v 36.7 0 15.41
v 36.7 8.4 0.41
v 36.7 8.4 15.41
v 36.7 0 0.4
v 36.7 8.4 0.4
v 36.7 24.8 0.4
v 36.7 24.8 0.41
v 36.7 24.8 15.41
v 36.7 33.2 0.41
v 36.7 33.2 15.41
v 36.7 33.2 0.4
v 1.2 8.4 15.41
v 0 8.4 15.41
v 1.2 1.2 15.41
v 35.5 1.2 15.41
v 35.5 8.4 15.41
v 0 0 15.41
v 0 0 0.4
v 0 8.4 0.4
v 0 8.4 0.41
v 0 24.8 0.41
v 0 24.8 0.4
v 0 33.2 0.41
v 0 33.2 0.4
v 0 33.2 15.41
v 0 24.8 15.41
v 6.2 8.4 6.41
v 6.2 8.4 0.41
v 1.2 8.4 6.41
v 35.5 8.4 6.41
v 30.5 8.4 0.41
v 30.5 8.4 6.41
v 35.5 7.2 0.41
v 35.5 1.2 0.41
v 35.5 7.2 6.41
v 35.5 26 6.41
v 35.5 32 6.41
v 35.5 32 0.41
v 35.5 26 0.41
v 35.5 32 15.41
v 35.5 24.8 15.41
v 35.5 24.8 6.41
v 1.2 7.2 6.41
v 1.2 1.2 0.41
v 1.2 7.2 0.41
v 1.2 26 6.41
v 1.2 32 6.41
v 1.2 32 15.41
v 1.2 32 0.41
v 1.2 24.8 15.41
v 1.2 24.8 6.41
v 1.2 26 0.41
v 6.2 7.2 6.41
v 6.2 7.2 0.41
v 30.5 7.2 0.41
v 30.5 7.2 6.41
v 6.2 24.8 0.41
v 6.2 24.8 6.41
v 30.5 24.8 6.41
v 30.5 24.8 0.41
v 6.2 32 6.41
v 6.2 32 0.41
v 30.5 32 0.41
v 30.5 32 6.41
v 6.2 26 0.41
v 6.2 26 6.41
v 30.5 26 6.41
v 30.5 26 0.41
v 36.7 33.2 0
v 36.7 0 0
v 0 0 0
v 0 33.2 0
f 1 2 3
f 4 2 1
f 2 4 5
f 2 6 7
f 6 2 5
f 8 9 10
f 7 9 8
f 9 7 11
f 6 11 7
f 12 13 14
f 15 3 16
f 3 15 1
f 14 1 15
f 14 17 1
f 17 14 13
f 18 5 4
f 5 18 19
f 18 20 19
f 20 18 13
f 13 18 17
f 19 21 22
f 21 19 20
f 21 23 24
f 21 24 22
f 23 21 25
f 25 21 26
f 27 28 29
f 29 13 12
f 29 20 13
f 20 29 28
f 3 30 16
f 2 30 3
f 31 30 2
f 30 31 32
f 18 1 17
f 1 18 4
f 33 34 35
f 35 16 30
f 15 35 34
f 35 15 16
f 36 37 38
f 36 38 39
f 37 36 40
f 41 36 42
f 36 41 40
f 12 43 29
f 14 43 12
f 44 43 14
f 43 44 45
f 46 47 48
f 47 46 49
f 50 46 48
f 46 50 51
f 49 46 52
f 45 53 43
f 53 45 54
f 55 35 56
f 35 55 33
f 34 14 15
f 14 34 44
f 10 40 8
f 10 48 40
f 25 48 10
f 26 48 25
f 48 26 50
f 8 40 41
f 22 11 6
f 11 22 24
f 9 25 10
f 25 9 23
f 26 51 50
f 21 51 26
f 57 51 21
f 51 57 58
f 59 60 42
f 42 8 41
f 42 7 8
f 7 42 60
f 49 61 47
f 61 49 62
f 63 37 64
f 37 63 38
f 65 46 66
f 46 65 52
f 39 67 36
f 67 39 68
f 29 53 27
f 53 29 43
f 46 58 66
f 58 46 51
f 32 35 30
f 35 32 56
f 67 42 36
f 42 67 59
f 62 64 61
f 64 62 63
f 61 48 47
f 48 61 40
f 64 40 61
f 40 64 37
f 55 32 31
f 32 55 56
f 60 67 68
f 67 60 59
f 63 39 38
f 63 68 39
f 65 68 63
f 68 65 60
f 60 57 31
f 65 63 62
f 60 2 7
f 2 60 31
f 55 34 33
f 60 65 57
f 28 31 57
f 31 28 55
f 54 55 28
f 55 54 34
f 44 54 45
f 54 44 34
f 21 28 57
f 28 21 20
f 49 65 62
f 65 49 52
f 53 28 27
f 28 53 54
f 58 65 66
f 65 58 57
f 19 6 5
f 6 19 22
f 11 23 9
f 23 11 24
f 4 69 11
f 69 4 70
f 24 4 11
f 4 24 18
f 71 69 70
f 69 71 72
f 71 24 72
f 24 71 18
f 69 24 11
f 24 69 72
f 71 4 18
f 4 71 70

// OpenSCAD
// file: ../../Base/Boxes.scad
// Fischertechnik Box Foundation
// Pre-designed Boxes

use <Constants.scad>

include <PlacementOptions.scad>

box190Width = 190;
box190Depth = 130;
box130Width = 130;
box130Depth = 95;
boxUsageHeight = 33.9;
boxWallThickness = 2.4;
boxBaseThickness = 1.0;
boxWebWidth = 3.0;

// getBoxWallThickness()
// Gets the wall thickness of a Fischertechnik Box

function getBoxWallThickness() = boxWallThickness;

// Gets the usable height of a fischertechnik box
function getBoxUsageHeight() = boxUsageHeight;

// Gets the thickness of the Fischertechnik box base.
function getBoxBaseThickness() = boxBaseThickness;

// Gets the width of a box web
function getBoxWebWidth() = boxWebWidth;

// Gets the usable inner space of a Box 190 as an x/y-list
function getBox190Space() = [
    box190Width - 2*getBoxWallThickness(), 
    box190Depth - 2*getBoxWallThickness() ];

// Imports the Fischertechnik empty box 130x190 mm and places it at position 0,0
// 190x130 are the outer sizes, the inner space is slightly smaller. Use getBox190Space() to get the inner sizes.
// This module needs the STL file "Fischertechnik Box 130x190.stl" in the library path.
// The box is positioned that the usable inner space is at the 0,0,0 position. The

module Box190() {
    translate([-getBoxWallThickness(),-getBoxWallThickness(),-getBoxBaseThickness()])
        import("Fischertechnik Box 130x190.stl", convexity=3);
}

// Gets the usable inner space of a Box 130 as an x/y-list
function getBox130Space() = [
    box130Width - 2*getBoxWallThickness(), 
    box130Depth - 2*getBoxWallThickness() ];

// Imports the Fischertechnik empty box 95x130 mm and places it at position 0,0
// 190x130 are the outer sizes, the inner space is slightly smaller. Use getBox190Space() to get the inner sizes.
// This module needs the STL file "Fischertechnik Box 95x130.stl" in the library path.
// The box is positioned that the usable inner space is at the 0,0,0 position. The

module Box130() {
    translate([-getBoxWallThickness(),-getBoxWallThickness(),-getBoxBaseThickness()])
        import("Fischertechnik Box 95x130.stl", convexity=3);
}

// Creates a web at the specified box walls
// corner 0 = LowerLeft, 1 = UpperLeft, 2 = UpperRight, 3 = LowerRight
// side 0 = LeftOfCorner, 1 = RightOfCorner
// distance = Distance in mm from the corner
// box = inner width and depth of the box (default: Box 190)
// webWidth = length of the web (default is 3 mms)
// webThickness = thickness of the web (default is 1 mm)

module BoxWeb(corner, side, distance, box=getBox190Space(), webWidth=getBoxWebWidth(), webThickness=1.0) {
    sink = getBoxWallThickness()/2;

    width = (corner % 2 == 0) ? 
            (side == LeftOfCorner ? webWidth : webThickness) :
            (side == LeftOfCorner ? webThickness : webWidth);

    depth = (corner % 2 == 0) ? 
            (side == RightOfCorner ? webWidth : webThickness) :
            (side == RightOfCorner ? webThickness : webWidth);
    
    xDiff = corner == LowerLeft ? 
                (side == LeftOfCorner ? -sink : distance) :
            (corner == UpperLeft ?                
                (side == LeftOfCorner ? distance : -sink) :
            (corner == UpperRight ?
                (side == LeftOfCorner ? box.x-webWidth+sink : box.x-distance-webThickness) :
                (side == LeftOfCorner ? box.x-distance-webThickness: box.x-webWidth+sink)));

    yDiff = corner == LowerLeft ? 
                (side == RightOfCorner ? -sink : distance) :
            (corner == UpperLeft ?
                (side == RightOfCorner ? box.y-distance : box.y-webWidth+sink) :
            (corner == UpperRight ?
                (side == RightOfCorner ? box.y-webWidth+sink : box.y-distance) :
                (side == RightOfCorner ? distance : -sink)));
    
    translate([xDiff, yDiff, -getExcess()])
        cube([width, depth, boxUsageHeight + 2*getExcess()]);
}
// file: ../../Base/Rotation.scad
// Fischertechnik Box Foundation
// Geometry Helpers Rotation

include <PlacementOptions.scad>

// getRotatedSpace(space, rotation=NoRotation)
// Rotates the space dependent on the specified rotation

function getRotatedSpace(space, rotation=NoRotation) = [
    (rotation == Rotate90 || rotation == Rotate270) ? space.y : space.x,
    (rotation == Rotate90 || rotation == Rotate270) ? space.x : space.y
];

// Rotates the given space around the fixed left lower corner
// space = the space the children needs as width/depth list [width,depth]
// rotation = 0 Rotate0 degrees, 1 Rotate90 degrees, 2 Rotate180 degrees, 3 Rotate270 degrees (equivalent to -90)

module RotateFix(space, rotation=Rotate0) {
    dy = (rotation == Rotate0 || rotation == Rotate270) ? 0 :
        (rotation == Rotate90) ? space.x :
        space.y;
    dx = (rotation < Rotate180) ? 0 :
        (rotation == Rotate180) ? space.x :
        space.y;
    
    translate([dx, dy, 0])
        rotate([0, 0, rotations[rotation]])
            children();
}
// file: ../../Base/Alignment.scad
// Fischertechnik Box Foundation
// Geometry Helpers Alignment

include <PlacementOptions.scad>

// getAlignedX(elementWidth, spaceWidth, align=AlignRight, offset=0)
// Gets the aligned X offset of an element with the given
// width in the given space.
// elementWidth = The width of the element to positon
// spaceWidth = The space where the element should be aligned
// align = 0 AlignLeft, 1 AlignCenter, 2 AlignRight
// offset = an optional offset from the aligned position. When
// aligned left or centered, then positive values are in X direction.
// When aligned right then positive values are in negative X direction.

function getAlignedX(elementWidth, spaceWidth, align=AlignRight, offset=0) =
    (align == AlignLeft) ?
        offset :
        ((align == AlignCenter) ?
        (spaceWidth - elementWidth)/2 + offset :
        spaceWidth - offset - elementWidth);

// getAlignedY(elementDepth, spaceDepth, align=AlignTop, offset=0)
// Gets the aligned Y offset of an element with the given
// depth in the given space.
// elementDepth = The depth of the element to positon
// spaceDepth = The space where the element should be aligned
// align = 0 AlignBottom, 1 AlignCenter, 2 AlignTop
// offset = an optional offset from the aligned position. When
// aligned bottom or centered, then positive values are in Y direction.
// When aligned top then positive values are in negative Y direction.

function getAlignedY(elementDepth, spaceDepth, align=AlignTop, offset=0) =
    (align == AlignBottom) ?
        offset :
        ((align == AlignCenter) ?
        (spaceDepth - elementDepth)/2 + offset :
        spaceDepth - offset - elementDepth);
// file: ../../Base/PlacementOptions.scad
// Fischertechnik Box Foundation
// Placement Options

// Alignment
NoAlign = 0;
AlignLeft = 1;
AlignBottom = 2;
AlignCenter = 3;
AlignRight = 4;
AlignTop = 5;

// Element rotation degree steps
rotations = [0, -90, -180, -270];

// Rotation
NoRotation = 0;
Rotate0 = 0;
Rotate90 = 1;
Rotate180 = 2;
Rotate270 = 3;

// Docking (seen from above)
NoDock = -1;
DockLeft = 0;
DockTop = 1;
DockRight = 2;
DockCorner = 2;
DockBottom = 3;

// Web corners
LowerLeft = 0;
UpperLeft = 1;
UpperRight = 2;
LowerRight = 3;

// Web position relative to corner
LeftOfCorner = 0;
RightOfCorner = 1;
// file: ../../Base/Placement.scad
// Fischertechnik Box Foundation
// Geometry Helpers Placement

use <Constants.scad>
use <Alignment.scad>
use <Rotation.scad>
use <Boxes.scad>

include <PlacementOptions.scad>

// Place(x=0, y=0, elementSpace=[0,0], alignX=AlignLeft, alignY=AlignBottom, rotation=Rotate0, boxSpace=getBox190Space())
// Places the child at the specified position
// y = Y-Position. This is a relative position when an X aligment is specified.
// x = X-Position. This is a relative position when an Y aligment is specified.
// elementSpace = space of the element to be placed [x,y]
// alignX = -1=NoAlign, 0 AlignLeft, 1 AlignCenter, 3 AlignRight (elementSpace and boxSpace required!)
// alignY = -1=NoAlign, 2 AlignBottom, 1 AlignCenter, 4 AlignTop (elementSpace and boxSpace required!)
// rotation = 0 Rotate0 0 degrees, 1 Rotate90 90 degrees, 
// 2 Rotate180 180 degrees, 3 Rotate270 270 degrees (equivalent to -90)
// boxSpace = Inner space of the box where the placement occurs [x,y] - default is Box 190x130 inner space

module Place(x=0, y=0, elementSpace=[0,0], 
  alignX=AlignLeft, alignY=AlignBottom, 
  rotation=NoRotation, boxSpace=getBox190Space()) {

    module Position(x, y, space, rotation=Rotate0) {
        translate([x, y, 0])
            RotateFix(space, rotation)
                children();
    }

    space = getRotatedSpace(elementSpace, rotation);
    alignedX = getAlignedX(space.x, boxSpace.x, alignX, x);
    alignedY = getAlignedY(space.y, boxSpace.y, alignY, y);
    Position(alignedX, alignedY, elementSpace, rotation)
        children();
}

// Center(space=getBox130Space(), elementSpace=[0,0])
// space = Space where the children is centered. For cylinder use centered=true and no elementSpace.
// elementSpace = space of the element to be centered [x,y]

module Center(space=getBox190Space(), elementSpace=[0,0]) {
    translate([(space.x - elementSpace.x) / 2, (space.y - elementSpace.y) / 2])
        children(0);
}

// CenterHorizontal(width=0, y=0, offset=0, space=getBox130Space())
// space = Space where the children is centered. For cylinder use centered=true and no elementSpace.
// elementSpace = space of the element to be centered [x,y]

module CenterHorizontal(width=0, y=0, offset=0, space=getBox190Space()) {
    translate([(space.x - width) / 2 + offset, y])
        children(0);
}

// CenterVertical(depth=0, x=0, offset=0, space=getBox130Space())
// space = Space where the children is centered. For cylinder use centered=true and no elementSpace.
// elementSpace = space of the element to be centered [x,y]

module CenterVertical(depth=0, x=0, offset=0, space=getBox190Space()) {
    translate([x, (space.y - depth) / 2 + offset])
        children(0);
}
// file: ../../Elements/AxisClip10.scad
// Fischertechnik Box Library
// Axis for clip 10
// 31023

use <../ModelBase/Simple.scad>

width = 12;
depth = 12;
height = 23;

// getAxisClip10Space()
// Gets the space of a frame for a clip 10 with spring ring (mot2)

function getAxisClip10Space() = [width, depth, height];

// AxisClip10()
// Axis for clip 10 with spring ring (mot2)

module AxisClip10() {
    LeveledAxisWithSpace(height, height-10, getAxisClip10Space());
}

// Tests
color("lightgray")
AxisClip10();
// file: ../../Base/Constants.scad
// Fischertechnik Box Foundation
// Constants

// Constant values necessary for multiple elements

// Base constants
dividerThickness = 1.2;
excess = 0.01;
fragments = 90;
tolerance = 0.8;

// Gets the thickness of a divider 
function getDividerThickness() = dividerThickness;

// Gets the excess that is used to merge walls into each other
function getExcess() = excess;

// Gets amount of fragments of a cylinder
function getFragments() = fragments;

// Gets the inner tolerance of a frame to each side
function getTolerance() = tolerance;


// Fischertechnik specific constants
axisDiameter = 4;
axisBottomDiameter = axisDiameter + 1;
standardEdgeDistance = 2.5;
standardWebDistance = 11.5;
standardCornerLength = 15;
tubeWallFactor = 0.8;

// Gets axis diameter
function getAxisDiameter() = axisDiameter;

// Gets axis bottom diameter for thicker part at the bottom
function getAxisBottomDiameter() = axisBottomDiameter;

// gets the standard distance to the wall of the box for dockable frames with webs
function getStandardEdgeDistance() = standardEdgeDistance;

// gets the standard distance of each web to the corner of the dockable frame
function getStandardWebDistance() = standardWebDistance;

// gets the standard length of the corner walls of a dockable frame
function getStandardCornerLength() = standardCornerLength;

// gets the wall thickness of a tube.
function getTubeWallThickness() = tubeWallFactor * getDividerThickness();
// file: ../../Elements/FrameLens.scad
// Fischertechnik Box Library
// Frame for Lenses
// 31365, 31366, 31367 

use <../ModelBase/Simple.scad>
use <../ModelBase/Complex.scad>

width = 33.5;
depth = 30;
height = 6.0;

// getFrameLensSpace()
// Gets the outer space the lens frame needs.

function getFrameLensSpace() = getFrameOuterVolume([width, depth, height]);

// FrameLens()
// Frame for 30 mm flat lenses.

module FrameLens() {
    FrameSpecialFlat([width, depth, height]);
}

// Tests
color("lightgray") {
    FrameLens();
}
// file: ../TestPrint.scad
// 3D Print Test Base

use <../Base/Constants.scad>

use <../Elements/AxisClip10.scad>

module TestPrint(elementSpace) {
    cube([elementSpace.x, elementSpace.y, 0.4]);
    translate([0,0,0.4+getExcess()]) {
        children();
    }
}

TestPrint(getAxisClip10Space())
    AxisClip10();
// main file
// 3D Print Test Base
// FrameLens

use <../TestPrint.scad>
use <../../Elements/FrameLens.scad>

TestPrint(getFrameLensSpace())
    FrameLens();
